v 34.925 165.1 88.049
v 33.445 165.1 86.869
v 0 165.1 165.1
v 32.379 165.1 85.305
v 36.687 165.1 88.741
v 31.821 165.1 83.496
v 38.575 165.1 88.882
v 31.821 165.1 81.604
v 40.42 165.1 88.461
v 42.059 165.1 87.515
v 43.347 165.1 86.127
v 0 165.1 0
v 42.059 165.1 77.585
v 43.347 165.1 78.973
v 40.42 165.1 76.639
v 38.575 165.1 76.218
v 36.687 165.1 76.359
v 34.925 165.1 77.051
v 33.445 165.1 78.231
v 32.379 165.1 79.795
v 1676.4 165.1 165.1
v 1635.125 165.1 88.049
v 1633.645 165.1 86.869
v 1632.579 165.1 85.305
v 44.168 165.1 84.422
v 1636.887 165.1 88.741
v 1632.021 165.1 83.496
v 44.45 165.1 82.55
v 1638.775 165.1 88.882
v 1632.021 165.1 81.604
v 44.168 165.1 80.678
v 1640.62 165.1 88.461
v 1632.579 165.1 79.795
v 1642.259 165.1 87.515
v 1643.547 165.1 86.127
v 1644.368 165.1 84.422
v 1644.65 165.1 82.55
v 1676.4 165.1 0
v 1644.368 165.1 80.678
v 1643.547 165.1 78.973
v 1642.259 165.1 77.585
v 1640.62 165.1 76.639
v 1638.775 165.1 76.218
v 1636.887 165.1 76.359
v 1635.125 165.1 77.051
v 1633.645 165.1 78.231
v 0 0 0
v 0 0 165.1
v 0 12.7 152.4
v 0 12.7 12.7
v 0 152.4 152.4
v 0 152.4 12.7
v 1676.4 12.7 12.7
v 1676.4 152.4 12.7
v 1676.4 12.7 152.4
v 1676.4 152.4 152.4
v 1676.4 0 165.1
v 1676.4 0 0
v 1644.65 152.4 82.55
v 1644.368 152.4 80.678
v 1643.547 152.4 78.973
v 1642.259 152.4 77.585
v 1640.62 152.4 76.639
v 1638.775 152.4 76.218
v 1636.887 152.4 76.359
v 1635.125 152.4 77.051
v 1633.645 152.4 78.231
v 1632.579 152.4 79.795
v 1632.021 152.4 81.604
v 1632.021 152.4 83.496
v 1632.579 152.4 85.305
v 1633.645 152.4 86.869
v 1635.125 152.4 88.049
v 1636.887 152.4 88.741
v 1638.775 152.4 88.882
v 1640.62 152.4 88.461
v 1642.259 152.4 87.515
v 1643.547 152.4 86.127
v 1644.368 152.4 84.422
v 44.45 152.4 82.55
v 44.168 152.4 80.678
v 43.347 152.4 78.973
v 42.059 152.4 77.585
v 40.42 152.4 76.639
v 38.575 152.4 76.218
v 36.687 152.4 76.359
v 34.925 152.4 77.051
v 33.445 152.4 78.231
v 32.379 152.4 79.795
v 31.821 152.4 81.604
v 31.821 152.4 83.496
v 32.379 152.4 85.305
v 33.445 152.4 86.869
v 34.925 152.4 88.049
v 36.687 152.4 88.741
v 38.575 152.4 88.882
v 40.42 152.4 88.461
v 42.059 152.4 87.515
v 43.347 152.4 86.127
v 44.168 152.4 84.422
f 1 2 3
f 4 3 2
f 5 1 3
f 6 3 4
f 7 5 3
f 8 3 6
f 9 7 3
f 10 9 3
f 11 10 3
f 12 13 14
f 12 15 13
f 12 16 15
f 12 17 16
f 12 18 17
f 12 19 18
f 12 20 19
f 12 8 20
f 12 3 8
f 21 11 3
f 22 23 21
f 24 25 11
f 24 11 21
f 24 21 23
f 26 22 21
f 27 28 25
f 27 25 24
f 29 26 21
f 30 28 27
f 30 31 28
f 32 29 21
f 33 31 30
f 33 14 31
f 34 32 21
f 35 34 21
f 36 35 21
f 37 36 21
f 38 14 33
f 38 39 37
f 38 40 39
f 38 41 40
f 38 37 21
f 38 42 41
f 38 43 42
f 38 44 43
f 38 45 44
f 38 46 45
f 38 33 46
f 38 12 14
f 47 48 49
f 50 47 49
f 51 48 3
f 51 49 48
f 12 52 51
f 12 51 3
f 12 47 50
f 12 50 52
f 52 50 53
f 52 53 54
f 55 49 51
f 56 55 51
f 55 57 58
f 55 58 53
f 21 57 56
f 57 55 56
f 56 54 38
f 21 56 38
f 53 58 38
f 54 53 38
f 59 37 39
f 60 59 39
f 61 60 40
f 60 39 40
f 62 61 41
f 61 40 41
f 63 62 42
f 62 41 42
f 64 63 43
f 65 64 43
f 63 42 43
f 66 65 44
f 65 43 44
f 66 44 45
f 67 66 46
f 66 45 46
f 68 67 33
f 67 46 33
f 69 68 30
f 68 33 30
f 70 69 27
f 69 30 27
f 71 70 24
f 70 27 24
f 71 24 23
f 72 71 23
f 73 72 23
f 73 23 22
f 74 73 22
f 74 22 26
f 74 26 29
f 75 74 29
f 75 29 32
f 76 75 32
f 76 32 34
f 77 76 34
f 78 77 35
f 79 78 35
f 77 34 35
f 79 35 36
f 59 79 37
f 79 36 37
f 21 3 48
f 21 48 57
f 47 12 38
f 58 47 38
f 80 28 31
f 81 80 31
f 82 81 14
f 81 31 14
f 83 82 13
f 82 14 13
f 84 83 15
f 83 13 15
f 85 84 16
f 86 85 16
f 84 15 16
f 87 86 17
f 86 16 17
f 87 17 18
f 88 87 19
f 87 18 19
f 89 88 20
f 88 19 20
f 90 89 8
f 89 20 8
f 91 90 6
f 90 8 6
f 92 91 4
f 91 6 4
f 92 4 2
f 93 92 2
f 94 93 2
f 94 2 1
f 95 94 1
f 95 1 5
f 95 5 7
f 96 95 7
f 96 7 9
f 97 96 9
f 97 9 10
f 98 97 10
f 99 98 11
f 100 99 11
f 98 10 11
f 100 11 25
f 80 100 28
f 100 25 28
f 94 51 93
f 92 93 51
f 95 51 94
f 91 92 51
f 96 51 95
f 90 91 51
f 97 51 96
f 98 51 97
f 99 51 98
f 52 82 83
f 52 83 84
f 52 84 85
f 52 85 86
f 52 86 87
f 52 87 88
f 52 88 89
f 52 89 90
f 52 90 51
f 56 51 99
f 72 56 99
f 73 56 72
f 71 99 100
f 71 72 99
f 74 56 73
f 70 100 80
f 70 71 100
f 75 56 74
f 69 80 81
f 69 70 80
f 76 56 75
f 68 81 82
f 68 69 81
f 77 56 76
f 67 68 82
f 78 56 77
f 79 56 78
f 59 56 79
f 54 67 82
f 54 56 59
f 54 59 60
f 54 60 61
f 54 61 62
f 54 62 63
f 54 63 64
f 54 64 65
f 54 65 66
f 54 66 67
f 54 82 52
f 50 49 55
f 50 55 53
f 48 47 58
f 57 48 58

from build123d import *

# Parameters (mm, degrees)
SKETCH1_W           = 1676.4
SKETCH1_H           = 165.1
BOSS_EXTRUDE1_DEPTH = 165.1
SKETCH2_W           = 139.7
SKETCH2_H           = 139.7
CUT_EXTRUDE1_DEPTH  = 1676.4
SKETCH4_R           = 6.35
CUT_EXTRUDE3_DEPTH  = 12.7


with BuildPart() as part:
    # Sketch1 → Boss-Extrude1 (new body)
    with BuildSketch(Plane.XY):
        with Locations((838.2, 82.55)):
            Rectangle(SKETCH1_W, SKETCH1_H)
    extrude(amount=BOSS_EXTRUDE1_DEPTH)

    # Sketch2 → Cut-Extrude1 (cut)
    with BuildSketch(Plane(origin=(1676.4, 0, 0), x_dir=(0, 0, -1), z_dir=(1, 0, 0))):
        with Locations((-82.55, 82.55)):
            Rectangle(SKETCH2_W, SKETCH2_H)
    extrude(amount=-CUT_EXTRUDE1_DEPTH, mode=Mode.SUBTRACT)

    # Sketch4 → Cut-Extrude3 (cut)
    with BuildSketch(Plane(origin=(0, 165.1, 0), x_dir=(1, 0, 0), z_dir=(0, 1, 0))):
        with Locations((38.1, -82.55)):
            Circle(SKETCH4_R)
        with Locations((1638.3, -82.55)):
            Circle(SKETCH4_R)
    extrude(amount=-CUT_EXTRUDE3_DEPTH, mode=Mode.SUBTRACT)


solid = part.part
